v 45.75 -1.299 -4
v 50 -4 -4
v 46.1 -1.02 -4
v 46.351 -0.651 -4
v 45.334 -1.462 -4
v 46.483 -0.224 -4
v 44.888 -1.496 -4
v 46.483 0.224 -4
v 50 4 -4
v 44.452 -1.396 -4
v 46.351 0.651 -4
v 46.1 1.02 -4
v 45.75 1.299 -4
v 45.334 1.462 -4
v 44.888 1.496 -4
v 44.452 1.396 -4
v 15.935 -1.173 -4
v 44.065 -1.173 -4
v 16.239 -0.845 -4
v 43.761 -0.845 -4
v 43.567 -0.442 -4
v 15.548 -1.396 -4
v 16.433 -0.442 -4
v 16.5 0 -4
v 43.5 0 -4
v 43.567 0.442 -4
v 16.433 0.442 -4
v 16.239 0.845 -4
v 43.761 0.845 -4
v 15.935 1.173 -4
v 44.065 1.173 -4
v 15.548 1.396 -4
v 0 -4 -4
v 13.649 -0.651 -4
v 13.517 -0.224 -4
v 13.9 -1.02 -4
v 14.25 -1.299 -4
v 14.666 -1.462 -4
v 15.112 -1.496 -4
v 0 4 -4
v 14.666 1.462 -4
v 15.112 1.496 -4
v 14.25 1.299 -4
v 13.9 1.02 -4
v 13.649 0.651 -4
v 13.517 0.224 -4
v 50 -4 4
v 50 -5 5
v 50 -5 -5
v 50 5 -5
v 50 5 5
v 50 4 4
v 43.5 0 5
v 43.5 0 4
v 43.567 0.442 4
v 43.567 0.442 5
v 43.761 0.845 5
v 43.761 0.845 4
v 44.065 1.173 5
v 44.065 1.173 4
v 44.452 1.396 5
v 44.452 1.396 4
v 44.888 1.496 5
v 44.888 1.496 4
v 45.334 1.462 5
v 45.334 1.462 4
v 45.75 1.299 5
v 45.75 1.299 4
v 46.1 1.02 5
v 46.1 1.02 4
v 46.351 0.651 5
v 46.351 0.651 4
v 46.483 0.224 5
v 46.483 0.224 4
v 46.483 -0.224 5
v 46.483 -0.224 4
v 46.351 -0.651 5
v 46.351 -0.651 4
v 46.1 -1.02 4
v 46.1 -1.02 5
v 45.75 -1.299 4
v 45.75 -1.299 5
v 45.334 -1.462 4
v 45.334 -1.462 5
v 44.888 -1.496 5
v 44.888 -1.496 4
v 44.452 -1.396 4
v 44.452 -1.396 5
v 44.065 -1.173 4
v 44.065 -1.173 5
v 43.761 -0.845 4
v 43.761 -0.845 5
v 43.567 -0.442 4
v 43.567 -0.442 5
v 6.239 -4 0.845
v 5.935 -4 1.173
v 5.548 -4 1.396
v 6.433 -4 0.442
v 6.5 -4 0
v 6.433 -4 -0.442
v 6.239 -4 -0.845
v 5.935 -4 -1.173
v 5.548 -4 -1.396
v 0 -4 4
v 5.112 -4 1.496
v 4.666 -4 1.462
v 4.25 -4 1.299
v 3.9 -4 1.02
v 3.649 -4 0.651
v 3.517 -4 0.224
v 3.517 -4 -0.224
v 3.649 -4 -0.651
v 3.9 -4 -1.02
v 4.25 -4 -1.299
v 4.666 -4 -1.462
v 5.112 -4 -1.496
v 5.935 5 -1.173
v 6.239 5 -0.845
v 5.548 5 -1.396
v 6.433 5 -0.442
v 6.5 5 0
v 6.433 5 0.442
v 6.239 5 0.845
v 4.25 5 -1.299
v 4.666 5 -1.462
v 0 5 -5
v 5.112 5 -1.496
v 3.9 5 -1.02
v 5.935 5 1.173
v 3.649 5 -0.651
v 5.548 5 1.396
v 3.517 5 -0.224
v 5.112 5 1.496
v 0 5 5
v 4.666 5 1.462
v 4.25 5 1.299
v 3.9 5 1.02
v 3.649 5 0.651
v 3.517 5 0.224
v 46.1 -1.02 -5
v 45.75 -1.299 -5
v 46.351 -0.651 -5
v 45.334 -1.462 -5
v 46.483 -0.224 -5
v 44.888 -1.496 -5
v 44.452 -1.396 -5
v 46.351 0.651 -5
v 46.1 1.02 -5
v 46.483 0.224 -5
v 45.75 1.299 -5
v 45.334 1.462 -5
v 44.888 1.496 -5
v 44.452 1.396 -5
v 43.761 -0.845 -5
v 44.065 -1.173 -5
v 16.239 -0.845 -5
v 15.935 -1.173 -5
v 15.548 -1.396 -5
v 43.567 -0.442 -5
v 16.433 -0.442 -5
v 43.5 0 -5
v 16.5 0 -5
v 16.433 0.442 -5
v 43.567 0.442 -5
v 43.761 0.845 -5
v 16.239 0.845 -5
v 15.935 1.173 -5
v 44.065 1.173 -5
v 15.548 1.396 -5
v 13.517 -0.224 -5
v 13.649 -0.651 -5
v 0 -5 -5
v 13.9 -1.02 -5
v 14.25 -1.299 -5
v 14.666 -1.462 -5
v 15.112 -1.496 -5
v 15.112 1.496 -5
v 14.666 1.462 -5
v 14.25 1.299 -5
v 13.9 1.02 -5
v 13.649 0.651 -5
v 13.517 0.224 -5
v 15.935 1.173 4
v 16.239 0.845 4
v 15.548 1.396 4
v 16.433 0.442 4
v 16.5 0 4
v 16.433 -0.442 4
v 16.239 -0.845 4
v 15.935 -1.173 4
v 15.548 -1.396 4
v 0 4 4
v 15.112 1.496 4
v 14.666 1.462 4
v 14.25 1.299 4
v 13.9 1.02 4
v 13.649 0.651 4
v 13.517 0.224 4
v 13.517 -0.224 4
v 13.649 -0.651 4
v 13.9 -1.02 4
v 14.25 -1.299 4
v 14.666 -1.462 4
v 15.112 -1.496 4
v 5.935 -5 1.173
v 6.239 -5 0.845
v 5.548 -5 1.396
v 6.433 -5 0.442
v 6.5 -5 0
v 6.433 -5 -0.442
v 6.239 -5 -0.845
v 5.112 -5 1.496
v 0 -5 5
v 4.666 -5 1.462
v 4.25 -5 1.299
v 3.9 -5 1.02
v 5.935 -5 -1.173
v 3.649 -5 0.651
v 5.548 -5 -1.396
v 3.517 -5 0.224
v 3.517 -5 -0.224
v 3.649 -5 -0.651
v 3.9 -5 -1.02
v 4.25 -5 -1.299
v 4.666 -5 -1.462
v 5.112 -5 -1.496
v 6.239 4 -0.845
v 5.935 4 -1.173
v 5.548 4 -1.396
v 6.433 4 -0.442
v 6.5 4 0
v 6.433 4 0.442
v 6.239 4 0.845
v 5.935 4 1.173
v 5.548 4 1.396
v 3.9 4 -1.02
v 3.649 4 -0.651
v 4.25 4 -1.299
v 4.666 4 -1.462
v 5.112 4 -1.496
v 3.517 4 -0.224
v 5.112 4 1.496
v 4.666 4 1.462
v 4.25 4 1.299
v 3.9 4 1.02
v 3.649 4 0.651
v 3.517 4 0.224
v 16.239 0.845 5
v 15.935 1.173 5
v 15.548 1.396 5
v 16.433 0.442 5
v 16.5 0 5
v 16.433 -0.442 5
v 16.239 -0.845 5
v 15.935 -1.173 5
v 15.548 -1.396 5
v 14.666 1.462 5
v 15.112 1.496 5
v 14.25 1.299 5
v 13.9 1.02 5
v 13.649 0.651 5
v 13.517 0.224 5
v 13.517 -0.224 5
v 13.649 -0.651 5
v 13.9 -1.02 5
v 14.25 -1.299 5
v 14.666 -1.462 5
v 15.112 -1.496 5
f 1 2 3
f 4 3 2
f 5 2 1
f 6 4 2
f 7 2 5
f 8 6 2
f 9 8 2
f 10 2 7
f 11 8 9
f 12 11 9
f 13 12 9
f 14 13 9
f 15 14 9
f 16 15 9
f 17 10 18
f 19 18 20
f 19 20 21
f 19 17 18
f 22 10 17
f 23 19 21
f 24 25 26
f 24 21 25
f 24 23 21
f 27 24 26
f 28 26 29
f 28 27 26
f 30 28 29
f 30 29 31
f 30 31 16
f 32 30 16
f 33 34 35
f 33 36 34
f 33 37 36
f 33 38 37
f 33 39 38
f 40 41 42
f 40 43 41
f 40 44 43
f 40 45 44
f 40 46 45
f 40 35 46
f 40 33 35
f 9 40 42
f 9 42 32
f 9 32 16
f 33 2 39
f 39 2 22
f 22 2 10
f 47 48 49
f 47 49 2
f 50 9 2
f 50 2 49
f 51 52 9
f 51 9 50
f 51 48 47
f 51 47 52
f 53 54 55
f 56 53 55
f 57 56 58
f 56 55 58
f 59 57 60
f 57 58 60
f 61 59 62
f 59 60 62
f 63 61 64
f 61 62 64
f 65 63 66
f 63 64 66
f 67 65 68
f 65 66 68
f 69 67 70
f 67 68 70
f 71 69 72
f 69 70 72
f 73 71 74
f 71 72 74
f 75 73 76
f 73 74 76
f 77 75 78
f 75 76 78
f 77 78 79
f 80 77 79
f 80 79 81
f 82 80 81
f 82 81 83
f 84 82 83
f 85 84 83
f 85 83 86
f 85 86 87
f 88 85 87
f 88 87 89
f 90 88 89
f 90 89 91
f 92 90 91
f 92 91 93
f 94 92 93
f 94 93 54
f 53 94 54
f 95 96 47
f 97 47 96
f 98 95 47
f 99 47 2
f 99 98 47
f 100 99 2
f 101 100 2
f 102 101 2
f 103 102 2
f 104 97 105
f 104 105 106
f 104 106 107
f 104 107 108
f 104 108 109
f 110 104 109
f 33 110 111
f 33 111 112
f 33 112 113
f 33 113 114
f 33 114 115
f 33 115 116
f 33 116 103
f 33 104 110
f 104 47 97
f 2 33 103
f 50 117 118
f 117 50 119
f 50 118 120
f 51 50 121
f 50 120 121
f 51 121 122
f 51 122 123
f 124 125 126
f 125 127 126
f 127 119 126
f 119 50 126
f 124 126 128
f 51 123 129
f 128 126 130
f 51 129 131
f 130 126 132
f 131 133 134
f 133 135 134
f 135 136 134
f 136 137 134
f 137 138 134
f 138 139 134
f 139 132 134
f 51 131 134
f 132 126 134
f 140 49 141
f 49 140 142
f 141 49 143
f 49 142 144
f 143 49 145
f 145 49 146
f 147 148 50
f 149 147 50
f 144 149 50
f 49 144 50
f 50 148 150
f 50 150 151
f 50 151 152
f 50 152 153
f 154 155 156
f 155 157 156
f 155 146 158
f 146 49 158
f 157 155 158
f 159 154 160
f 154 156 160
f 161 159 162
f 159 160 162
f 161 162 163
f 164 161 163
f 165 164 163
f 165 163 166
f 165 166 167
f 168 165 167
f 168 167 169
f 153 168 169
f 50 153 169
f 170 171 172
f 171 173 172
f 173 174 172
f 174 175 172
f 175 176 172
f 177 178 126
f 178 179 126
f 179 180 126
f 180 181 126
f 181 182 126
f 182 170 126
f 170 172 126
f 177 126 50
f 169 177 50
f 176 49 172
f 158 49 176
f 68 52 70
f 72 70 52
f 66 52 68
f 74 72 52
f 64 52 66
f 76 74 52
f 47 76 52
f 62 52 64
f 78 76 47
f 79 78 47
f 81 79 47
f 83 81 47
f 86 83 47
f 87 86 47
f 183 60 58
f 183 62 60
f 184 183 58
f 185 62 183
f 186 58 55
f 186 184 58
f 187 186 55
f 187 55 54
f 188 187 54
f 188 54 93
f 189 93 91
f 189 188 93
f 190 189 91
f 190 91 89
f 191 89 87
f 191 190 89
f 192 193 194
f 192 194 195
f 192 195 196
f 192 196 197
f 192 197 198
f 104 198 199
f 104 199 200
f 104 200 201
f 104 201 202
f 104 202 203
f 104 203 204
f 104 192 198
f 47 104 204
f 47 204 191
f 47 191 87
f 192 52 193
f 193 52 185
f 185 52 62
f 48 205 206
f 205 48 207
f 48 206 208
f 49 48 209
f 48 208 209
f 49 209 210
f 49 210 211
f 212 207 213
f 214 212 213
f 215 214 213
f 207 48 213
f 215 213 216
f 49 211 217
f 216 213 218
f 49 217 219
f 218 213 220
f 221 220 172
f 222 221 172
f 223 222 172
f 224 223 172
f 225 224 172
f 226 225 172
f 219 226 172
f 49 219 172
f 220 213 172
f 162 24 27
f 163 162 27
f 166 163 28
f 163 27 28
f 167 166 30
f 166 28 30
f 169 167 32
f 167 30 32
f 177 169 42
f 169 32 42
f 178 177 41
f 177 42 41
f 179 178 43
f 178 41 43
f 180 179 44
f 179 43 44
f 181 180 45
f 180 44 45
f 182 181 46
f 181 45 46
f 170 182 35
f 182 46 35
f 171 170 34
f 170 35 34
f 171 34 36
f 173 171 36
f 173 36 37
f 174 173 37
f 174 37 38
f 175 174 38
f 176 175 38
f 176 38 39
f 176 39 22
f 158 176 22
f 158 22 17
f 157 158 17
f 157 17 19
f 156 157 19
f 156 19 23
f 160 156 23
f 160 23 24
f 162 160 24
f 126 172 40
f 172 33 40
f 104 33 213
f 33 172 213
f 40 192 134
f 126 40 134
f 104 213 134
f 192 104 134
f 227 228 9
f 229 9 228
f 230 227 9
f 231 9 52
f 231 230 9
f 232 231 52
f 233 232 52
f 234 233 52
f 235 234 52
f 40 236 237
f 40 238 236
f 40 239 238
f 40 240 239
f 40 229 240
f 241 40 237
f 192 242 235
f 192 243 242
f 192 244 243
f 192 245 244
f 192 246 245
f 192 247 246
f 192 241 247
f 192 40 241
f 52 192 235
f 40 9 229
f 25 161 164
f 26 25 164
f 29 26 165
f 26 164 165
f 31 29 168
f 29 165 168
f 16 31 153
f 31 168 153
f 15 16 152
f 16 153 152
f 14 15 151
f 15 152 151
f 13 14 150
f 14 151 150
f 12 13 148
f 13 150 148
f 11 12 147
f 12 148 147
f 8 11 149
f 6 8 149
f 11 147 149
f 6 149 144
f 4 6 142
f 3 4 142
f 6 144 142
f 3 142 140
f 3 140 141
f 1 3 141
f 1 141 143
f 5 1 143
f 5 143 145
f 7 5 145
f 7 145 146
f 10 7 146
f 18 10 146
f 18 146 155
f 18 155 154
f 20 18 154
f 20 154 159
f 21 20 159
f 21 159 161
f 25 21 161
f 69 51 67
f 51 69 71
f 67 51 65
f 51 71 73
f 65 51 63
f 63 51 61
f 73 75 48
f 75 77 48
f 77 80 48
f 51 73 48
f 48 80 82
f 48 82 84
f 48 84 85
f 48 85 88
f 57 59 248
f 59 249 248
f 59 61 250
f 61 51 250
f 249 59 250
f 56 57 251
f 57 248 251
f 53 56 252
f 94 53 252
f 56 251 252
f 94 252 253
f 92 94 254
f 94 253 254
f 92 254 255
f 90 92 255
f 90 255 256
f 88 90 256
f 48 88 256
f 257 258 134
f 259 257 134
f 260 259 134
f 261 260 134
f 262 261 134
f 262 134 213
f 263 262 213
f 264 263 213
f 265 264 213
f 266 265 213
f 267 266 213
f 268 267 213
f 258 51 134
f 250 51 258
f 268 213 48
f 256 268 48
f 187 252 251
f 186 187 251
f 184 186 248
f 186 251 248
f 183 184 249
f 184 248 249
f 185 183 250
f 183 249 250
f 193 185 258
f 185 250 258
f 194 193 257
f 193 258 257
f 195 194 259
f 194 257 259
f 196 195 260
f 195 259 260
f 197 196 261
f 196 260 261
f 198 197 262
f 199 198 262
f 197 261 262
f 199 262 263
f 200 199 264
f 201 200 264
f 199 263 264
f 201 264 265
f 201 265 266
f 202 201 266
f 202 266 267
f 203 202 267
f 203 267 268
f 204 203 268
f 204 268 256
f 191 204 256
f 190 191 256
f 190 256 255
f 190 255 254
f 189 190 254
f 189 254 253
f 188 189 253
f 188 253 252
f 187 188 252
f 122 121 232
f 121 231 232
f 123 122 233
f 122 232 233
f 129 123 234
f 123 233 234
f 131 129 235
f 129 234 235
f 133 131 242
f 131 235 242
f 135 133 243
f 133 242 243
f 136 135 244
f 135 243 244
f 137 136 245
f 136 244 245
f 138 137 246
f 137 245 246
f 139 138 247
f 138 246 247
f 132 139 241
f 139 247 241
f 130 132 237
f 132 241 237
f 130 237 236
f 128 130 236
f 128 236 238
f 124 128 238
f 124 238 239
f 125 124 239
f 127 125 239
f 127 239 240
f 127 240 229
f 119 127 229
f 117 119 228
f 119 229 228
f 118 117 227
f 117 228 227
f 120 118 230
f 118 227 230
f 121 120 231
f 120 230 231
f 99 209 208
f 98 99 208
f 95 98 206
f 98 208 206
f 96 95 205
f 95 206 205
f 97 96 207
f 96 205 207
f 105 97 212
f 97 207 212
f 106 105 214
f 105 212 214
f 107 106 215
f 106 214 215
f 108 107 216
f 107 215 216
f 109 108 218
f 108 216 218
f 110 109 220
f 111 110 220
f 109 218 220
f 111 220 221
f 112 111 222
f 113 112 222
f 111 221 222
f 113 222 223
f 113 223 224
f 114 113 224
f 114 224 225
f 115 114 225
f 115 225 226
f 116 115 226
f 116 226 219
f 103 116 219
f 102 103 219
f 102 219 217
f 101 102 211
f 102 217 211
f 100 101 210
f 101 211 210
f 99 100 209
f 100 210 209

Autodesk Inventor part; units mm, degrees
ref_plane "YZ Plane" through (0, 0, 0) normal (1, 0, 0) x (0, 1, 0)
ref_plane "XZ Plane" through (0, 0, 0) normal (0, 1, 0) x (-1, 0, 0)
ref_plane "XY Plane" through (0, 0, 0) normal (0, 0, 1) x (1, 0, 0)
sketch "スケッチ1" plane through (0, 0, 0) normal (1, 0, 0) x (0, 1, 0)
  line L0 (5, 5) -> (-5, 5)
  line L1 (-5, 5) -> (-5, -5)
  line L2 (-5, -5) -> (5, -5)
  line L3 (5, -5) -> (5, 5)
  line L4 (4, 4) -> (-4, 4)
  line L5 (-4, 4) -> (-4, -4)
  line L6 (-4, -4) -> (4, -4)
  line L7 (4, -4) -> (4, 4)
  point P0 (0, 0)
  dimension "d0" = 1
  dimension "d1" = 1
  dimension "d2" = 1
  dimension "d3" = 1
  dimension "d4" = 10
  dimension "d5" = 10
  dimension "d6" = 5
  dimension "d7" = 5
extrude "押し出し1" add sketch "スケッチ1" along normal blind 50
sketch "スケッチ2" plane through (0, -5, 5) normal (0, 0, 1) x (1, 0, 0)
  circle A0 centre (15, 5) radius 1.5
  line L0 (0, 0) -> (50, 0) projected
  line L1 (0, 10) -> (0, 0) projected
  point P0 (0, 5)
  dimension "d10" = 5
  dimension "d11" = 3
  dimension "d12" = 15
extrude "押し出し2" cut sketch "スケッチ2" against normal blind 50
sketch "スケッチ3" plane through (0, -5, -5) normal (0, -1, 0) x (1, 0, 0)
  circle A0 centre (5, 5) radius 1.5
  line L0 (0, 10) -> (0, 0) projected
  line L1 (0, 0) -> (50, 0) projected
  point P0 (0, 5)
  dimension "d15" = 5
  dimension "d16" = 5
  dimension "d17" = 3
extrude "押し出し3" cut sketch "スケッチ3" against normal blind 50
sketch "スケッチ4" plane through (0, -5, -5) normal (0, 0, -1) x (-1, 0, 0)
  circle A0 centre (-45, 5) radius 1.5
  line L0 (0, 10) -> (-50, 10) projected
  line L1 (-50, 0) -> (-50, 10) projected
  point P0 (0, 5)
  dimension "d20" = 3
  dimension "d21" = 5
  dimension "d22" = 5
extrude "押し出し4" cut sketch "スケッチ4" against normal blind 50
properties part number "flontparts1" material "アルミニウム 6061"
